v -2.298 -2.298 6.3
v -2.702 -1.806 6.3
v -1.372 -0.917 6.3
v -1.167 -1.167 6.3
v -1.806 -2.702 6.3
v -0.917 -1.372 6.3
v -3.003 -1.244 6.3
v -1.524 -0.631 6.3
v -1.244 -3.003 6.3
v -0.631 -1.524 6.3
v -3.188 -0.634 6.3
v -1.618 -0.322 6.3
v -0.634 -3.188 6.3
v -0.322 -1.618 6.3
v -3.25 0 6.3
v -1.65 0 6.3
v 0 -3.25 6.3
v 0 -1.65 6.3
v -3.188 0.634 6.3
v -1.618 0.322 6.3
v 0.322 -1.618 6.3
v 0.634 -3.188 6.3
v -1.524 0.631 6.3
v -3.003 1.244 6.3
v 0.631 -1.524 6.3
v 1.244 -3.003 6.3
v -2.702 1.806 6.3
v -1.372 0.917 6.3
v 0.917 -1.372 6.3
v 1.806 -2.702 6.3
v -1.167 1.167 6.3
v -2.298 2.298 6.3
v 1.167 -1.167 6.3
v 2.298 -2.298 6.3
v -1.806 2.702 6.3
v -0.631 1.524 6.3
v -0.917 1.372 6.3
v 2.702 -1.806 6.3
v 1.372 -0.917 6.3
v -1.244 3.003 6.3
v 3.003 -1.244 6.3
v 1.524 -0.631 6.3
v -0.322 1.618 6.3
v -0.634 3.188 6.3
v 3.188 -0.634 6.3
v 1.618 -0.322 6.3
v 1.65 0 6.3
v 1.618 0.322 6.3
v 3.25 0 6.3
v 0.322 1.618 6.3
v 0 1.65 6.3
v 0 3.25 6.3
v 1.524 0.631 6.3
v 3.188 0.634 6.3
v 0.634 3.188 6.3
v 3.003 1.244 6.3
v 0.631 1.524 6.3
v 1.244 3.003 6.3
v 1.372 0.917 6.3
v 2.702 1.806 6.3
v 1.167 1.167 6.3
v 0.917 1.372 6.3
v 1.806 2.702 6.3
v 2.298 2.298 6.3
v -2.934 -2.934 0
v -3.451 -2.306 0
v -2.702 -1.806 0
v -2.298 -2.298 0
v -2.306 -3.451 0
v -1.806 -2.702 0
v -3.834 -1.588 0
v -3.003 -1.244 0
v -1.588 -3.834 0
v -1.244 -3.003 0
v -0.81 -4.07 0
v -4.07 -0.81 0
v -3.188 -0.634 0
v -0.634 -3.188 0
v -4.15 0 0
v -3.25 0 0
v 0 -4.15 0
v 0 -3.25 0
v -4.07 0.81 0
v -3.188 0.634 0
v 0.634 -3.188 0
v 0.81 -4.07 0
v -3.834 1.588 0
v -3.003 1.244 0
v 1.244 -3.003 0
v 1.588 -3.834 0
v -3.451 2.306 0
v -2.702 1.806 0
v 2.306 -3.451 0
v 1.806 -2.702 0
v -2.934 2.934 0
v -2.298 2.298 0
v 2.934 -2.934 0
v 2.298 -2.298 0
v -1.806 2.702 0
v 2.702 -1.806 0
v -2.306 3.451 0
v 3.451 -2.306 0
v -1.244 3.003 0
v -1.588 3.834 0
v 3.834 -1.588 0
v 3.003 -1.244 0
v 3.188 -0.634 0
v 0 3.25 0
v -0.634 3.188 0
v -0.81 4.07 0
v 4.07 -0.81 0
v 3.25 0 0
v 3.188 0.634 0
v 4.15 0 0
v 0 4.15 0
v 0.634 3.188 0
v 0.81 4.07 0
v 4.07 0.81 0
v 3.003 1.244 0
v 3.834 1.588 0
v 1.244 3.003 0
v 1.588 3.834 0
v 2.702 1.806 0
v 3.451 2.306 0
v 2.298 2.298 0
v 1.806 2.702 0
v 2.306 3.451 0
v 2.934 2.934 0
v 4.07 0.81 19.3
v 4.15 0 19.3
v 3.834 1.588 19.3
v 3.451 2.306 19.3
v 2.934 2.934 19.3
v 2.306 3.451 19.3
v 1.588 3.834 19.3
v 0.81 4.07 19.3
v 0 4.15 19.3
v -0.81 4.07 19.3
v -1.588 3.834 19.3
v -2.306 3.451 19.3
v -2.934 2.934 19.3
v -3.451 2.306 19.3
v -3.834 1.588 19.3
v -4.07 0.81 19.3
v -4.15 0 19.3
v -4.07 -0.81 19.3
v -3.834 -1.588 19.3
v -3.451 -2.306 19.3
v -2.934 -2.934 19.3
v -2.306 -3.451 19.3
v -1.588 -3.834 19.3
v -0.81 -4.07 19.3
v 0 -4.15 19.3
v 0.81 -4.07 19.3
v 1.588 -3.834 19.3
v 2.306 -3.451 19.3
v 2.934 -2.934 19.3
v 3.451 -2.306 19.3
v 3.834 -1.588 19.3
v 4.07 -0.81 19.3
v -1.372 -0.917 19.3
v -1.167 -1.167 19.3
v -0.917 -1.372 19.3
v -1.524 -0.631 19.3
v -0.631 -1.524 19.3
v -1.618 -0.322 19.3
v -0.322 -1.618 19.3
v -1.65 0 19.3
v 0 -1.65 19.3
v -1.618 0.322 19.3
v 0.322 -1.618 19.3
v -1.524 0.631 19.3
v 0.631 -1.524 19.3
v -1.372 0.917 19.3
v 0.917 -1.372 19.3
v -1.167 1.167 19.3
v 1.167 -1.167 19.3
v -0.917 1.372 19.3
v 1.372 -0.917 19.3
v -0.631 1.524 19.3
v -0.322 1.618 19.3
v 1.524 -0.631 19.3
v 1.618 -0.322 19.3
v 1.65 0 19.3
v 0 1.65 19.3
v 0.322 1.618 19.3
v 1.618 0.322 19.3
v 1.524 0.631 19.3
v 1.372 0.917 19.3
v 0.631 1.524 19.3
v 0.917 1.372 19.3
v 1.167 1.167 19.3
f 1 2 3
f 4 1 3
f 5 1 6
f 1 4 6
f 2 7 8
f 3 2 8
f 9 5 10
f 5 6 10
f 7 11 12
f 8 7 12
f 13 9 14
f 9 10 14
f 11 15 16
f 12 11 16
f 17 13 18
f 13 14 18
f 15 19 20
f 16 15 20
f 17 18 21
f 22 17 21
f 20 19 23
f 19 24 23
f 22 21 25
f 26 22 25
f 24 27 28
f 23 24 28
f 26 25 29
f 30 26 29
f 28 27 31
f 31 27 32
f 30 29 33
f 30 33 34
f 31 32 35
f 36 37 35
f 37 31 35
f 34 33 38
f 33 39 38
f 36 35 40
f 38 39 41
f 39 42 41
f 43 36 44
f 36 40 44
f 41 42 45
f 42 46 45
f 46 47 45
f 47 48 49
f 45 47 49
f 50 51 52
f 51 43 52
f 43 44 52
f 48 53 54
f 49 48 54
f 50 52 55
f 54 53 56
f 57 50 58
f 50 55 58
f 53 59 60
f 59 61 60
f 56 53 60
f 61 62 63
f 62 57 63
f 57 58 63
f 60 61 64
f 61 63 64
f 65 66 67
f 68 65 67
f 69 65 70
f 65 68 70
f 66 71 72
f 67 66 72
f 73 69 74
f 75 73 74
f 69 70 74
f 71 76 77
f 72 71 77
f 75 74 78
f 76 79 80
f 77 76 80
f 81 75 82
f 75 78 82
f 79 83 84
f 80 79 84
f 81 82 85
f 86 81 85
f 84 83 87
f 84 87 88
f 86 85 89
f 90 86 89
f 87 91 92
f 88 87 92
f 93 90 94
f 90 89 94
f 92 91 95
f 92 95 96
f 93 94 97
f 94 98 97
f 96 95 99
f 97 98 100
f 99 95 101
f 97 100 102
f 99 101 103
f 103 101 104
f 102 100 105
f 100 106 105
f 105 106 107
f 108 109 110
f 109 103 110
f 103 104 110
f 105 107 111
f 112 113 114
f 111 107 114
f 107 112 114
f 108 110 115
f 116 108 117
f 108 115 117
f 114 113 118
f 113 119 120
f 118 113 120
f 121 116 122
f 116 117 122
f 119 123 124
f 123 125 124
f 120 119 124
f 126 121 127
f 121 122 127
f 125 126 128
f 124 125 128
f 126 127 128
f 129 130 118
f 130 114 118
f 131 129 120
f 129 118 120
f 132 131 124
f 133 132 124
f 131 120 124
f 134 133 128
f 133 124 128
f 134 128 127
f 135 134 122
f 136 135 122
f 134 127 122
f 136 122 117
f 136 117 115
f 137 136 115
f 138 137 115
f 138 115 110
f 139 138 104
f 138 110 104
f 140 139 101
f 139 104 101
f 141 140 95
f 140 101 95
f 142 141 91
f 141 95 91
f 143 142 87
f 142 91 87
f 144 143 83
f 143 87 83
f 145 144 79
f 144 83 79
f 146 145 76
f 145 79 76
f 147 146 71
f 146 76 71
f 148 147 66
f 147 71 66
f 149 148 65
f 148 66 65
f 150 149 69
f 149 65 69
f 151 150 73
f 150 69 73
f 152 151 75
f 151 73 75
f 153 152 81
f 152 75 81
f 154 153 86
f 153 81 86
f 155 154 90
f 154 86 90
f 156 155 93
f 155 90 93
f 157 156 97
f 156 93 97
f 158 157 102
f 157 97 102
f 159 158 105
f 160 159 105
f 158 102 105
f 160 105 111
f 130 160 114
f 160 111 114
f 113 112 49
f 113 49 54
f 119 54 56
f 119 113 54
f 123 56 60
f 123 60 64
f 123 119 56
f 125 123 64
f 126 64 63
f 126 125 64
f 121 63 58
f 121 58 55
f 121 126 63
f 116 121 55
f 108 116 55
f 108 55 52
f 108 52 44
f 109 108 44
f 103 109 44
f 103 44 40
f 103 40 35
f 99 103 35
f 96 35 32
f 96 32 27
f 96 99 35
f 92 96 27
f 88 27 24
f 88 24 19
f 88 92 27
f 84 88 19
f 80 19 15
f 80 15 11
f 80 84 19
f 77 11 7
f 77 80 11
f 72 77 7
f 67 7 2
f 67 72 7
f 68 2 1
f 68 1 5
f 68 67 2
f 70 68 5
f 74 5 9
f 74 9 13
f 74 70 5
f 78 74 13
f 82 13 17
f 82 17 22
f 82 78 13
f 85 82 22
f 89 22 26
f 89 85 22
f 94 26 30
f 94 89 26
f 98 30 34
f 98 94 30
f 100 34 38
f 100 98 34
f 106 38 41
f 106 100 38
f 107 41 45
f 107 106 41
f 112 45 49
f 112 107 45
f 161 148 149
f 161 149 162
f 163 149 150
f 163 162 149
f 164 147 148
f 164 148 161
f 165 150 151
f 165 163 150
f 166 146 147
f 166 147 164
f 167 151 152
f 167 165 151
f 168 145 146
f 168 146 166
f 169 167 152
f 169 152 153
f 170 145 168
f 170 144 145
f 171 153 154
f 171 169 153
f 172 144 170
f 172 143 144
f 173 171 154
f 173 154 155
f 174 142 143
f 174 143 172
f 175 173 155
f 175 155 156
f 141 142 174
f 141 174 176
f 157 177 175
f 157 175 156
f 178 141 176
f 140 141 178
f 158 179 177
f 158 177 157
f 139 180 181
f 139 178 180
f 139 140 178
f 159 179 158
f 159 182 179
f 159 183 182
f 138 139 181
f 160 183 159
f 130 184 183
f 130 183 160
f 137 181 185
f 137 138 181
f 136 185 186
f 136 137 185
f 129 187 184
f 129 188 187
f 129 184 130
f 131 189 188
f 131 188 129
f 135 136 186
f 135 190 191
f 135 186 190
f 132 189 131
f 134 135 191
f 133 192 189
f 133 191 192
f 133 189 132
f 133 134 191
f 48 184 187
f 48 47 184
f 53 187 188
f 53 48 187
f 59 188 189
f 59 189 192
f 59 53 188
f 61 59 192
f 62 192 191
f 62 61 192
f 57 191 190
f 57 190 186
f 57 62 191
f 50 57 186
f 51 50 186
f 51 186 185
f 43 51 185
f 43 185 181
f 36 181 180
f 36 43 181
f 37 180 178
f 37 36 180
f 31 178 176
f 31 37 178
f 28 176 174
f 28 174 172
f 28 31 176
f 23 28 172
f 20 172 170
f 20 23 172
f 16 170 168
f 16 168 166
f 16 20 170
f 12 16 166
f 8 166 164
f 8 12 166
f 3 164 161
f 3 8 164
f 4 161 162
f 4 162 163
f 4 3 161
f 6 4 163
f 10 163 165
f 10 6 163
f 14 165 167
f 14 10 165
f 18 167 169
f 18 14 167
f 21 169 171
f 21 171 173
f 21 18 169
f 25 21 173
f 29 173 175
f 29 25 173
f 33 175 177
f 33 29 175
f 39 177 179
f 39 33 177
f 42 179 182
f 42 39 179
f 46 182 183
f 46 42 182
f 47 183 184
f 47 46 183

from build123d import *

# Parameters (mm, degrees)
F0_R     = 4.15
F0_R_2   = 3.25
F1_DEPTH = 6.3
F2_R     = 4.15
F3_DEPTH = 1
F4_R     = 1.65
F5_DEPTH = 1
F6_R     = 4.15
F6_R_2   = 1.65
F7_DEPTH = 12


with BuildPart() as f1:
    # F0 (on Top) → F1 (new body)
    with BuildSketch(Plane.XY):
        Circle(F0_R)
        Circle(F0_R_2, mode=Mode.SUBTRACT)
    extrude(amount=F1_DEPTH)

    # F2 (on face) → F3 (join)
    with BuildSketch(Plane.XY.offset(6.3)):
        Circle(F2_R)
    extrude(amount=F3_DEPTH)

    # F4 (on face) → F5 (cut, through all)
    with BuildSketch(Plane.XY.offset(7.3)):
        Circle(F4_R)
    extrude(amount=-F5_DEPTH, mode=Mode.SUBTRACT)

    # F6 (on face) → F7 (join)
    with BuildSketch(Plane.XY.offset(7.3)):
        Circle(F6_R)
        Circle(F6_R_2, mode=Mode.SUBTRACT)
    extrude(amount=F7_DEPTH)


solid = f1.part
